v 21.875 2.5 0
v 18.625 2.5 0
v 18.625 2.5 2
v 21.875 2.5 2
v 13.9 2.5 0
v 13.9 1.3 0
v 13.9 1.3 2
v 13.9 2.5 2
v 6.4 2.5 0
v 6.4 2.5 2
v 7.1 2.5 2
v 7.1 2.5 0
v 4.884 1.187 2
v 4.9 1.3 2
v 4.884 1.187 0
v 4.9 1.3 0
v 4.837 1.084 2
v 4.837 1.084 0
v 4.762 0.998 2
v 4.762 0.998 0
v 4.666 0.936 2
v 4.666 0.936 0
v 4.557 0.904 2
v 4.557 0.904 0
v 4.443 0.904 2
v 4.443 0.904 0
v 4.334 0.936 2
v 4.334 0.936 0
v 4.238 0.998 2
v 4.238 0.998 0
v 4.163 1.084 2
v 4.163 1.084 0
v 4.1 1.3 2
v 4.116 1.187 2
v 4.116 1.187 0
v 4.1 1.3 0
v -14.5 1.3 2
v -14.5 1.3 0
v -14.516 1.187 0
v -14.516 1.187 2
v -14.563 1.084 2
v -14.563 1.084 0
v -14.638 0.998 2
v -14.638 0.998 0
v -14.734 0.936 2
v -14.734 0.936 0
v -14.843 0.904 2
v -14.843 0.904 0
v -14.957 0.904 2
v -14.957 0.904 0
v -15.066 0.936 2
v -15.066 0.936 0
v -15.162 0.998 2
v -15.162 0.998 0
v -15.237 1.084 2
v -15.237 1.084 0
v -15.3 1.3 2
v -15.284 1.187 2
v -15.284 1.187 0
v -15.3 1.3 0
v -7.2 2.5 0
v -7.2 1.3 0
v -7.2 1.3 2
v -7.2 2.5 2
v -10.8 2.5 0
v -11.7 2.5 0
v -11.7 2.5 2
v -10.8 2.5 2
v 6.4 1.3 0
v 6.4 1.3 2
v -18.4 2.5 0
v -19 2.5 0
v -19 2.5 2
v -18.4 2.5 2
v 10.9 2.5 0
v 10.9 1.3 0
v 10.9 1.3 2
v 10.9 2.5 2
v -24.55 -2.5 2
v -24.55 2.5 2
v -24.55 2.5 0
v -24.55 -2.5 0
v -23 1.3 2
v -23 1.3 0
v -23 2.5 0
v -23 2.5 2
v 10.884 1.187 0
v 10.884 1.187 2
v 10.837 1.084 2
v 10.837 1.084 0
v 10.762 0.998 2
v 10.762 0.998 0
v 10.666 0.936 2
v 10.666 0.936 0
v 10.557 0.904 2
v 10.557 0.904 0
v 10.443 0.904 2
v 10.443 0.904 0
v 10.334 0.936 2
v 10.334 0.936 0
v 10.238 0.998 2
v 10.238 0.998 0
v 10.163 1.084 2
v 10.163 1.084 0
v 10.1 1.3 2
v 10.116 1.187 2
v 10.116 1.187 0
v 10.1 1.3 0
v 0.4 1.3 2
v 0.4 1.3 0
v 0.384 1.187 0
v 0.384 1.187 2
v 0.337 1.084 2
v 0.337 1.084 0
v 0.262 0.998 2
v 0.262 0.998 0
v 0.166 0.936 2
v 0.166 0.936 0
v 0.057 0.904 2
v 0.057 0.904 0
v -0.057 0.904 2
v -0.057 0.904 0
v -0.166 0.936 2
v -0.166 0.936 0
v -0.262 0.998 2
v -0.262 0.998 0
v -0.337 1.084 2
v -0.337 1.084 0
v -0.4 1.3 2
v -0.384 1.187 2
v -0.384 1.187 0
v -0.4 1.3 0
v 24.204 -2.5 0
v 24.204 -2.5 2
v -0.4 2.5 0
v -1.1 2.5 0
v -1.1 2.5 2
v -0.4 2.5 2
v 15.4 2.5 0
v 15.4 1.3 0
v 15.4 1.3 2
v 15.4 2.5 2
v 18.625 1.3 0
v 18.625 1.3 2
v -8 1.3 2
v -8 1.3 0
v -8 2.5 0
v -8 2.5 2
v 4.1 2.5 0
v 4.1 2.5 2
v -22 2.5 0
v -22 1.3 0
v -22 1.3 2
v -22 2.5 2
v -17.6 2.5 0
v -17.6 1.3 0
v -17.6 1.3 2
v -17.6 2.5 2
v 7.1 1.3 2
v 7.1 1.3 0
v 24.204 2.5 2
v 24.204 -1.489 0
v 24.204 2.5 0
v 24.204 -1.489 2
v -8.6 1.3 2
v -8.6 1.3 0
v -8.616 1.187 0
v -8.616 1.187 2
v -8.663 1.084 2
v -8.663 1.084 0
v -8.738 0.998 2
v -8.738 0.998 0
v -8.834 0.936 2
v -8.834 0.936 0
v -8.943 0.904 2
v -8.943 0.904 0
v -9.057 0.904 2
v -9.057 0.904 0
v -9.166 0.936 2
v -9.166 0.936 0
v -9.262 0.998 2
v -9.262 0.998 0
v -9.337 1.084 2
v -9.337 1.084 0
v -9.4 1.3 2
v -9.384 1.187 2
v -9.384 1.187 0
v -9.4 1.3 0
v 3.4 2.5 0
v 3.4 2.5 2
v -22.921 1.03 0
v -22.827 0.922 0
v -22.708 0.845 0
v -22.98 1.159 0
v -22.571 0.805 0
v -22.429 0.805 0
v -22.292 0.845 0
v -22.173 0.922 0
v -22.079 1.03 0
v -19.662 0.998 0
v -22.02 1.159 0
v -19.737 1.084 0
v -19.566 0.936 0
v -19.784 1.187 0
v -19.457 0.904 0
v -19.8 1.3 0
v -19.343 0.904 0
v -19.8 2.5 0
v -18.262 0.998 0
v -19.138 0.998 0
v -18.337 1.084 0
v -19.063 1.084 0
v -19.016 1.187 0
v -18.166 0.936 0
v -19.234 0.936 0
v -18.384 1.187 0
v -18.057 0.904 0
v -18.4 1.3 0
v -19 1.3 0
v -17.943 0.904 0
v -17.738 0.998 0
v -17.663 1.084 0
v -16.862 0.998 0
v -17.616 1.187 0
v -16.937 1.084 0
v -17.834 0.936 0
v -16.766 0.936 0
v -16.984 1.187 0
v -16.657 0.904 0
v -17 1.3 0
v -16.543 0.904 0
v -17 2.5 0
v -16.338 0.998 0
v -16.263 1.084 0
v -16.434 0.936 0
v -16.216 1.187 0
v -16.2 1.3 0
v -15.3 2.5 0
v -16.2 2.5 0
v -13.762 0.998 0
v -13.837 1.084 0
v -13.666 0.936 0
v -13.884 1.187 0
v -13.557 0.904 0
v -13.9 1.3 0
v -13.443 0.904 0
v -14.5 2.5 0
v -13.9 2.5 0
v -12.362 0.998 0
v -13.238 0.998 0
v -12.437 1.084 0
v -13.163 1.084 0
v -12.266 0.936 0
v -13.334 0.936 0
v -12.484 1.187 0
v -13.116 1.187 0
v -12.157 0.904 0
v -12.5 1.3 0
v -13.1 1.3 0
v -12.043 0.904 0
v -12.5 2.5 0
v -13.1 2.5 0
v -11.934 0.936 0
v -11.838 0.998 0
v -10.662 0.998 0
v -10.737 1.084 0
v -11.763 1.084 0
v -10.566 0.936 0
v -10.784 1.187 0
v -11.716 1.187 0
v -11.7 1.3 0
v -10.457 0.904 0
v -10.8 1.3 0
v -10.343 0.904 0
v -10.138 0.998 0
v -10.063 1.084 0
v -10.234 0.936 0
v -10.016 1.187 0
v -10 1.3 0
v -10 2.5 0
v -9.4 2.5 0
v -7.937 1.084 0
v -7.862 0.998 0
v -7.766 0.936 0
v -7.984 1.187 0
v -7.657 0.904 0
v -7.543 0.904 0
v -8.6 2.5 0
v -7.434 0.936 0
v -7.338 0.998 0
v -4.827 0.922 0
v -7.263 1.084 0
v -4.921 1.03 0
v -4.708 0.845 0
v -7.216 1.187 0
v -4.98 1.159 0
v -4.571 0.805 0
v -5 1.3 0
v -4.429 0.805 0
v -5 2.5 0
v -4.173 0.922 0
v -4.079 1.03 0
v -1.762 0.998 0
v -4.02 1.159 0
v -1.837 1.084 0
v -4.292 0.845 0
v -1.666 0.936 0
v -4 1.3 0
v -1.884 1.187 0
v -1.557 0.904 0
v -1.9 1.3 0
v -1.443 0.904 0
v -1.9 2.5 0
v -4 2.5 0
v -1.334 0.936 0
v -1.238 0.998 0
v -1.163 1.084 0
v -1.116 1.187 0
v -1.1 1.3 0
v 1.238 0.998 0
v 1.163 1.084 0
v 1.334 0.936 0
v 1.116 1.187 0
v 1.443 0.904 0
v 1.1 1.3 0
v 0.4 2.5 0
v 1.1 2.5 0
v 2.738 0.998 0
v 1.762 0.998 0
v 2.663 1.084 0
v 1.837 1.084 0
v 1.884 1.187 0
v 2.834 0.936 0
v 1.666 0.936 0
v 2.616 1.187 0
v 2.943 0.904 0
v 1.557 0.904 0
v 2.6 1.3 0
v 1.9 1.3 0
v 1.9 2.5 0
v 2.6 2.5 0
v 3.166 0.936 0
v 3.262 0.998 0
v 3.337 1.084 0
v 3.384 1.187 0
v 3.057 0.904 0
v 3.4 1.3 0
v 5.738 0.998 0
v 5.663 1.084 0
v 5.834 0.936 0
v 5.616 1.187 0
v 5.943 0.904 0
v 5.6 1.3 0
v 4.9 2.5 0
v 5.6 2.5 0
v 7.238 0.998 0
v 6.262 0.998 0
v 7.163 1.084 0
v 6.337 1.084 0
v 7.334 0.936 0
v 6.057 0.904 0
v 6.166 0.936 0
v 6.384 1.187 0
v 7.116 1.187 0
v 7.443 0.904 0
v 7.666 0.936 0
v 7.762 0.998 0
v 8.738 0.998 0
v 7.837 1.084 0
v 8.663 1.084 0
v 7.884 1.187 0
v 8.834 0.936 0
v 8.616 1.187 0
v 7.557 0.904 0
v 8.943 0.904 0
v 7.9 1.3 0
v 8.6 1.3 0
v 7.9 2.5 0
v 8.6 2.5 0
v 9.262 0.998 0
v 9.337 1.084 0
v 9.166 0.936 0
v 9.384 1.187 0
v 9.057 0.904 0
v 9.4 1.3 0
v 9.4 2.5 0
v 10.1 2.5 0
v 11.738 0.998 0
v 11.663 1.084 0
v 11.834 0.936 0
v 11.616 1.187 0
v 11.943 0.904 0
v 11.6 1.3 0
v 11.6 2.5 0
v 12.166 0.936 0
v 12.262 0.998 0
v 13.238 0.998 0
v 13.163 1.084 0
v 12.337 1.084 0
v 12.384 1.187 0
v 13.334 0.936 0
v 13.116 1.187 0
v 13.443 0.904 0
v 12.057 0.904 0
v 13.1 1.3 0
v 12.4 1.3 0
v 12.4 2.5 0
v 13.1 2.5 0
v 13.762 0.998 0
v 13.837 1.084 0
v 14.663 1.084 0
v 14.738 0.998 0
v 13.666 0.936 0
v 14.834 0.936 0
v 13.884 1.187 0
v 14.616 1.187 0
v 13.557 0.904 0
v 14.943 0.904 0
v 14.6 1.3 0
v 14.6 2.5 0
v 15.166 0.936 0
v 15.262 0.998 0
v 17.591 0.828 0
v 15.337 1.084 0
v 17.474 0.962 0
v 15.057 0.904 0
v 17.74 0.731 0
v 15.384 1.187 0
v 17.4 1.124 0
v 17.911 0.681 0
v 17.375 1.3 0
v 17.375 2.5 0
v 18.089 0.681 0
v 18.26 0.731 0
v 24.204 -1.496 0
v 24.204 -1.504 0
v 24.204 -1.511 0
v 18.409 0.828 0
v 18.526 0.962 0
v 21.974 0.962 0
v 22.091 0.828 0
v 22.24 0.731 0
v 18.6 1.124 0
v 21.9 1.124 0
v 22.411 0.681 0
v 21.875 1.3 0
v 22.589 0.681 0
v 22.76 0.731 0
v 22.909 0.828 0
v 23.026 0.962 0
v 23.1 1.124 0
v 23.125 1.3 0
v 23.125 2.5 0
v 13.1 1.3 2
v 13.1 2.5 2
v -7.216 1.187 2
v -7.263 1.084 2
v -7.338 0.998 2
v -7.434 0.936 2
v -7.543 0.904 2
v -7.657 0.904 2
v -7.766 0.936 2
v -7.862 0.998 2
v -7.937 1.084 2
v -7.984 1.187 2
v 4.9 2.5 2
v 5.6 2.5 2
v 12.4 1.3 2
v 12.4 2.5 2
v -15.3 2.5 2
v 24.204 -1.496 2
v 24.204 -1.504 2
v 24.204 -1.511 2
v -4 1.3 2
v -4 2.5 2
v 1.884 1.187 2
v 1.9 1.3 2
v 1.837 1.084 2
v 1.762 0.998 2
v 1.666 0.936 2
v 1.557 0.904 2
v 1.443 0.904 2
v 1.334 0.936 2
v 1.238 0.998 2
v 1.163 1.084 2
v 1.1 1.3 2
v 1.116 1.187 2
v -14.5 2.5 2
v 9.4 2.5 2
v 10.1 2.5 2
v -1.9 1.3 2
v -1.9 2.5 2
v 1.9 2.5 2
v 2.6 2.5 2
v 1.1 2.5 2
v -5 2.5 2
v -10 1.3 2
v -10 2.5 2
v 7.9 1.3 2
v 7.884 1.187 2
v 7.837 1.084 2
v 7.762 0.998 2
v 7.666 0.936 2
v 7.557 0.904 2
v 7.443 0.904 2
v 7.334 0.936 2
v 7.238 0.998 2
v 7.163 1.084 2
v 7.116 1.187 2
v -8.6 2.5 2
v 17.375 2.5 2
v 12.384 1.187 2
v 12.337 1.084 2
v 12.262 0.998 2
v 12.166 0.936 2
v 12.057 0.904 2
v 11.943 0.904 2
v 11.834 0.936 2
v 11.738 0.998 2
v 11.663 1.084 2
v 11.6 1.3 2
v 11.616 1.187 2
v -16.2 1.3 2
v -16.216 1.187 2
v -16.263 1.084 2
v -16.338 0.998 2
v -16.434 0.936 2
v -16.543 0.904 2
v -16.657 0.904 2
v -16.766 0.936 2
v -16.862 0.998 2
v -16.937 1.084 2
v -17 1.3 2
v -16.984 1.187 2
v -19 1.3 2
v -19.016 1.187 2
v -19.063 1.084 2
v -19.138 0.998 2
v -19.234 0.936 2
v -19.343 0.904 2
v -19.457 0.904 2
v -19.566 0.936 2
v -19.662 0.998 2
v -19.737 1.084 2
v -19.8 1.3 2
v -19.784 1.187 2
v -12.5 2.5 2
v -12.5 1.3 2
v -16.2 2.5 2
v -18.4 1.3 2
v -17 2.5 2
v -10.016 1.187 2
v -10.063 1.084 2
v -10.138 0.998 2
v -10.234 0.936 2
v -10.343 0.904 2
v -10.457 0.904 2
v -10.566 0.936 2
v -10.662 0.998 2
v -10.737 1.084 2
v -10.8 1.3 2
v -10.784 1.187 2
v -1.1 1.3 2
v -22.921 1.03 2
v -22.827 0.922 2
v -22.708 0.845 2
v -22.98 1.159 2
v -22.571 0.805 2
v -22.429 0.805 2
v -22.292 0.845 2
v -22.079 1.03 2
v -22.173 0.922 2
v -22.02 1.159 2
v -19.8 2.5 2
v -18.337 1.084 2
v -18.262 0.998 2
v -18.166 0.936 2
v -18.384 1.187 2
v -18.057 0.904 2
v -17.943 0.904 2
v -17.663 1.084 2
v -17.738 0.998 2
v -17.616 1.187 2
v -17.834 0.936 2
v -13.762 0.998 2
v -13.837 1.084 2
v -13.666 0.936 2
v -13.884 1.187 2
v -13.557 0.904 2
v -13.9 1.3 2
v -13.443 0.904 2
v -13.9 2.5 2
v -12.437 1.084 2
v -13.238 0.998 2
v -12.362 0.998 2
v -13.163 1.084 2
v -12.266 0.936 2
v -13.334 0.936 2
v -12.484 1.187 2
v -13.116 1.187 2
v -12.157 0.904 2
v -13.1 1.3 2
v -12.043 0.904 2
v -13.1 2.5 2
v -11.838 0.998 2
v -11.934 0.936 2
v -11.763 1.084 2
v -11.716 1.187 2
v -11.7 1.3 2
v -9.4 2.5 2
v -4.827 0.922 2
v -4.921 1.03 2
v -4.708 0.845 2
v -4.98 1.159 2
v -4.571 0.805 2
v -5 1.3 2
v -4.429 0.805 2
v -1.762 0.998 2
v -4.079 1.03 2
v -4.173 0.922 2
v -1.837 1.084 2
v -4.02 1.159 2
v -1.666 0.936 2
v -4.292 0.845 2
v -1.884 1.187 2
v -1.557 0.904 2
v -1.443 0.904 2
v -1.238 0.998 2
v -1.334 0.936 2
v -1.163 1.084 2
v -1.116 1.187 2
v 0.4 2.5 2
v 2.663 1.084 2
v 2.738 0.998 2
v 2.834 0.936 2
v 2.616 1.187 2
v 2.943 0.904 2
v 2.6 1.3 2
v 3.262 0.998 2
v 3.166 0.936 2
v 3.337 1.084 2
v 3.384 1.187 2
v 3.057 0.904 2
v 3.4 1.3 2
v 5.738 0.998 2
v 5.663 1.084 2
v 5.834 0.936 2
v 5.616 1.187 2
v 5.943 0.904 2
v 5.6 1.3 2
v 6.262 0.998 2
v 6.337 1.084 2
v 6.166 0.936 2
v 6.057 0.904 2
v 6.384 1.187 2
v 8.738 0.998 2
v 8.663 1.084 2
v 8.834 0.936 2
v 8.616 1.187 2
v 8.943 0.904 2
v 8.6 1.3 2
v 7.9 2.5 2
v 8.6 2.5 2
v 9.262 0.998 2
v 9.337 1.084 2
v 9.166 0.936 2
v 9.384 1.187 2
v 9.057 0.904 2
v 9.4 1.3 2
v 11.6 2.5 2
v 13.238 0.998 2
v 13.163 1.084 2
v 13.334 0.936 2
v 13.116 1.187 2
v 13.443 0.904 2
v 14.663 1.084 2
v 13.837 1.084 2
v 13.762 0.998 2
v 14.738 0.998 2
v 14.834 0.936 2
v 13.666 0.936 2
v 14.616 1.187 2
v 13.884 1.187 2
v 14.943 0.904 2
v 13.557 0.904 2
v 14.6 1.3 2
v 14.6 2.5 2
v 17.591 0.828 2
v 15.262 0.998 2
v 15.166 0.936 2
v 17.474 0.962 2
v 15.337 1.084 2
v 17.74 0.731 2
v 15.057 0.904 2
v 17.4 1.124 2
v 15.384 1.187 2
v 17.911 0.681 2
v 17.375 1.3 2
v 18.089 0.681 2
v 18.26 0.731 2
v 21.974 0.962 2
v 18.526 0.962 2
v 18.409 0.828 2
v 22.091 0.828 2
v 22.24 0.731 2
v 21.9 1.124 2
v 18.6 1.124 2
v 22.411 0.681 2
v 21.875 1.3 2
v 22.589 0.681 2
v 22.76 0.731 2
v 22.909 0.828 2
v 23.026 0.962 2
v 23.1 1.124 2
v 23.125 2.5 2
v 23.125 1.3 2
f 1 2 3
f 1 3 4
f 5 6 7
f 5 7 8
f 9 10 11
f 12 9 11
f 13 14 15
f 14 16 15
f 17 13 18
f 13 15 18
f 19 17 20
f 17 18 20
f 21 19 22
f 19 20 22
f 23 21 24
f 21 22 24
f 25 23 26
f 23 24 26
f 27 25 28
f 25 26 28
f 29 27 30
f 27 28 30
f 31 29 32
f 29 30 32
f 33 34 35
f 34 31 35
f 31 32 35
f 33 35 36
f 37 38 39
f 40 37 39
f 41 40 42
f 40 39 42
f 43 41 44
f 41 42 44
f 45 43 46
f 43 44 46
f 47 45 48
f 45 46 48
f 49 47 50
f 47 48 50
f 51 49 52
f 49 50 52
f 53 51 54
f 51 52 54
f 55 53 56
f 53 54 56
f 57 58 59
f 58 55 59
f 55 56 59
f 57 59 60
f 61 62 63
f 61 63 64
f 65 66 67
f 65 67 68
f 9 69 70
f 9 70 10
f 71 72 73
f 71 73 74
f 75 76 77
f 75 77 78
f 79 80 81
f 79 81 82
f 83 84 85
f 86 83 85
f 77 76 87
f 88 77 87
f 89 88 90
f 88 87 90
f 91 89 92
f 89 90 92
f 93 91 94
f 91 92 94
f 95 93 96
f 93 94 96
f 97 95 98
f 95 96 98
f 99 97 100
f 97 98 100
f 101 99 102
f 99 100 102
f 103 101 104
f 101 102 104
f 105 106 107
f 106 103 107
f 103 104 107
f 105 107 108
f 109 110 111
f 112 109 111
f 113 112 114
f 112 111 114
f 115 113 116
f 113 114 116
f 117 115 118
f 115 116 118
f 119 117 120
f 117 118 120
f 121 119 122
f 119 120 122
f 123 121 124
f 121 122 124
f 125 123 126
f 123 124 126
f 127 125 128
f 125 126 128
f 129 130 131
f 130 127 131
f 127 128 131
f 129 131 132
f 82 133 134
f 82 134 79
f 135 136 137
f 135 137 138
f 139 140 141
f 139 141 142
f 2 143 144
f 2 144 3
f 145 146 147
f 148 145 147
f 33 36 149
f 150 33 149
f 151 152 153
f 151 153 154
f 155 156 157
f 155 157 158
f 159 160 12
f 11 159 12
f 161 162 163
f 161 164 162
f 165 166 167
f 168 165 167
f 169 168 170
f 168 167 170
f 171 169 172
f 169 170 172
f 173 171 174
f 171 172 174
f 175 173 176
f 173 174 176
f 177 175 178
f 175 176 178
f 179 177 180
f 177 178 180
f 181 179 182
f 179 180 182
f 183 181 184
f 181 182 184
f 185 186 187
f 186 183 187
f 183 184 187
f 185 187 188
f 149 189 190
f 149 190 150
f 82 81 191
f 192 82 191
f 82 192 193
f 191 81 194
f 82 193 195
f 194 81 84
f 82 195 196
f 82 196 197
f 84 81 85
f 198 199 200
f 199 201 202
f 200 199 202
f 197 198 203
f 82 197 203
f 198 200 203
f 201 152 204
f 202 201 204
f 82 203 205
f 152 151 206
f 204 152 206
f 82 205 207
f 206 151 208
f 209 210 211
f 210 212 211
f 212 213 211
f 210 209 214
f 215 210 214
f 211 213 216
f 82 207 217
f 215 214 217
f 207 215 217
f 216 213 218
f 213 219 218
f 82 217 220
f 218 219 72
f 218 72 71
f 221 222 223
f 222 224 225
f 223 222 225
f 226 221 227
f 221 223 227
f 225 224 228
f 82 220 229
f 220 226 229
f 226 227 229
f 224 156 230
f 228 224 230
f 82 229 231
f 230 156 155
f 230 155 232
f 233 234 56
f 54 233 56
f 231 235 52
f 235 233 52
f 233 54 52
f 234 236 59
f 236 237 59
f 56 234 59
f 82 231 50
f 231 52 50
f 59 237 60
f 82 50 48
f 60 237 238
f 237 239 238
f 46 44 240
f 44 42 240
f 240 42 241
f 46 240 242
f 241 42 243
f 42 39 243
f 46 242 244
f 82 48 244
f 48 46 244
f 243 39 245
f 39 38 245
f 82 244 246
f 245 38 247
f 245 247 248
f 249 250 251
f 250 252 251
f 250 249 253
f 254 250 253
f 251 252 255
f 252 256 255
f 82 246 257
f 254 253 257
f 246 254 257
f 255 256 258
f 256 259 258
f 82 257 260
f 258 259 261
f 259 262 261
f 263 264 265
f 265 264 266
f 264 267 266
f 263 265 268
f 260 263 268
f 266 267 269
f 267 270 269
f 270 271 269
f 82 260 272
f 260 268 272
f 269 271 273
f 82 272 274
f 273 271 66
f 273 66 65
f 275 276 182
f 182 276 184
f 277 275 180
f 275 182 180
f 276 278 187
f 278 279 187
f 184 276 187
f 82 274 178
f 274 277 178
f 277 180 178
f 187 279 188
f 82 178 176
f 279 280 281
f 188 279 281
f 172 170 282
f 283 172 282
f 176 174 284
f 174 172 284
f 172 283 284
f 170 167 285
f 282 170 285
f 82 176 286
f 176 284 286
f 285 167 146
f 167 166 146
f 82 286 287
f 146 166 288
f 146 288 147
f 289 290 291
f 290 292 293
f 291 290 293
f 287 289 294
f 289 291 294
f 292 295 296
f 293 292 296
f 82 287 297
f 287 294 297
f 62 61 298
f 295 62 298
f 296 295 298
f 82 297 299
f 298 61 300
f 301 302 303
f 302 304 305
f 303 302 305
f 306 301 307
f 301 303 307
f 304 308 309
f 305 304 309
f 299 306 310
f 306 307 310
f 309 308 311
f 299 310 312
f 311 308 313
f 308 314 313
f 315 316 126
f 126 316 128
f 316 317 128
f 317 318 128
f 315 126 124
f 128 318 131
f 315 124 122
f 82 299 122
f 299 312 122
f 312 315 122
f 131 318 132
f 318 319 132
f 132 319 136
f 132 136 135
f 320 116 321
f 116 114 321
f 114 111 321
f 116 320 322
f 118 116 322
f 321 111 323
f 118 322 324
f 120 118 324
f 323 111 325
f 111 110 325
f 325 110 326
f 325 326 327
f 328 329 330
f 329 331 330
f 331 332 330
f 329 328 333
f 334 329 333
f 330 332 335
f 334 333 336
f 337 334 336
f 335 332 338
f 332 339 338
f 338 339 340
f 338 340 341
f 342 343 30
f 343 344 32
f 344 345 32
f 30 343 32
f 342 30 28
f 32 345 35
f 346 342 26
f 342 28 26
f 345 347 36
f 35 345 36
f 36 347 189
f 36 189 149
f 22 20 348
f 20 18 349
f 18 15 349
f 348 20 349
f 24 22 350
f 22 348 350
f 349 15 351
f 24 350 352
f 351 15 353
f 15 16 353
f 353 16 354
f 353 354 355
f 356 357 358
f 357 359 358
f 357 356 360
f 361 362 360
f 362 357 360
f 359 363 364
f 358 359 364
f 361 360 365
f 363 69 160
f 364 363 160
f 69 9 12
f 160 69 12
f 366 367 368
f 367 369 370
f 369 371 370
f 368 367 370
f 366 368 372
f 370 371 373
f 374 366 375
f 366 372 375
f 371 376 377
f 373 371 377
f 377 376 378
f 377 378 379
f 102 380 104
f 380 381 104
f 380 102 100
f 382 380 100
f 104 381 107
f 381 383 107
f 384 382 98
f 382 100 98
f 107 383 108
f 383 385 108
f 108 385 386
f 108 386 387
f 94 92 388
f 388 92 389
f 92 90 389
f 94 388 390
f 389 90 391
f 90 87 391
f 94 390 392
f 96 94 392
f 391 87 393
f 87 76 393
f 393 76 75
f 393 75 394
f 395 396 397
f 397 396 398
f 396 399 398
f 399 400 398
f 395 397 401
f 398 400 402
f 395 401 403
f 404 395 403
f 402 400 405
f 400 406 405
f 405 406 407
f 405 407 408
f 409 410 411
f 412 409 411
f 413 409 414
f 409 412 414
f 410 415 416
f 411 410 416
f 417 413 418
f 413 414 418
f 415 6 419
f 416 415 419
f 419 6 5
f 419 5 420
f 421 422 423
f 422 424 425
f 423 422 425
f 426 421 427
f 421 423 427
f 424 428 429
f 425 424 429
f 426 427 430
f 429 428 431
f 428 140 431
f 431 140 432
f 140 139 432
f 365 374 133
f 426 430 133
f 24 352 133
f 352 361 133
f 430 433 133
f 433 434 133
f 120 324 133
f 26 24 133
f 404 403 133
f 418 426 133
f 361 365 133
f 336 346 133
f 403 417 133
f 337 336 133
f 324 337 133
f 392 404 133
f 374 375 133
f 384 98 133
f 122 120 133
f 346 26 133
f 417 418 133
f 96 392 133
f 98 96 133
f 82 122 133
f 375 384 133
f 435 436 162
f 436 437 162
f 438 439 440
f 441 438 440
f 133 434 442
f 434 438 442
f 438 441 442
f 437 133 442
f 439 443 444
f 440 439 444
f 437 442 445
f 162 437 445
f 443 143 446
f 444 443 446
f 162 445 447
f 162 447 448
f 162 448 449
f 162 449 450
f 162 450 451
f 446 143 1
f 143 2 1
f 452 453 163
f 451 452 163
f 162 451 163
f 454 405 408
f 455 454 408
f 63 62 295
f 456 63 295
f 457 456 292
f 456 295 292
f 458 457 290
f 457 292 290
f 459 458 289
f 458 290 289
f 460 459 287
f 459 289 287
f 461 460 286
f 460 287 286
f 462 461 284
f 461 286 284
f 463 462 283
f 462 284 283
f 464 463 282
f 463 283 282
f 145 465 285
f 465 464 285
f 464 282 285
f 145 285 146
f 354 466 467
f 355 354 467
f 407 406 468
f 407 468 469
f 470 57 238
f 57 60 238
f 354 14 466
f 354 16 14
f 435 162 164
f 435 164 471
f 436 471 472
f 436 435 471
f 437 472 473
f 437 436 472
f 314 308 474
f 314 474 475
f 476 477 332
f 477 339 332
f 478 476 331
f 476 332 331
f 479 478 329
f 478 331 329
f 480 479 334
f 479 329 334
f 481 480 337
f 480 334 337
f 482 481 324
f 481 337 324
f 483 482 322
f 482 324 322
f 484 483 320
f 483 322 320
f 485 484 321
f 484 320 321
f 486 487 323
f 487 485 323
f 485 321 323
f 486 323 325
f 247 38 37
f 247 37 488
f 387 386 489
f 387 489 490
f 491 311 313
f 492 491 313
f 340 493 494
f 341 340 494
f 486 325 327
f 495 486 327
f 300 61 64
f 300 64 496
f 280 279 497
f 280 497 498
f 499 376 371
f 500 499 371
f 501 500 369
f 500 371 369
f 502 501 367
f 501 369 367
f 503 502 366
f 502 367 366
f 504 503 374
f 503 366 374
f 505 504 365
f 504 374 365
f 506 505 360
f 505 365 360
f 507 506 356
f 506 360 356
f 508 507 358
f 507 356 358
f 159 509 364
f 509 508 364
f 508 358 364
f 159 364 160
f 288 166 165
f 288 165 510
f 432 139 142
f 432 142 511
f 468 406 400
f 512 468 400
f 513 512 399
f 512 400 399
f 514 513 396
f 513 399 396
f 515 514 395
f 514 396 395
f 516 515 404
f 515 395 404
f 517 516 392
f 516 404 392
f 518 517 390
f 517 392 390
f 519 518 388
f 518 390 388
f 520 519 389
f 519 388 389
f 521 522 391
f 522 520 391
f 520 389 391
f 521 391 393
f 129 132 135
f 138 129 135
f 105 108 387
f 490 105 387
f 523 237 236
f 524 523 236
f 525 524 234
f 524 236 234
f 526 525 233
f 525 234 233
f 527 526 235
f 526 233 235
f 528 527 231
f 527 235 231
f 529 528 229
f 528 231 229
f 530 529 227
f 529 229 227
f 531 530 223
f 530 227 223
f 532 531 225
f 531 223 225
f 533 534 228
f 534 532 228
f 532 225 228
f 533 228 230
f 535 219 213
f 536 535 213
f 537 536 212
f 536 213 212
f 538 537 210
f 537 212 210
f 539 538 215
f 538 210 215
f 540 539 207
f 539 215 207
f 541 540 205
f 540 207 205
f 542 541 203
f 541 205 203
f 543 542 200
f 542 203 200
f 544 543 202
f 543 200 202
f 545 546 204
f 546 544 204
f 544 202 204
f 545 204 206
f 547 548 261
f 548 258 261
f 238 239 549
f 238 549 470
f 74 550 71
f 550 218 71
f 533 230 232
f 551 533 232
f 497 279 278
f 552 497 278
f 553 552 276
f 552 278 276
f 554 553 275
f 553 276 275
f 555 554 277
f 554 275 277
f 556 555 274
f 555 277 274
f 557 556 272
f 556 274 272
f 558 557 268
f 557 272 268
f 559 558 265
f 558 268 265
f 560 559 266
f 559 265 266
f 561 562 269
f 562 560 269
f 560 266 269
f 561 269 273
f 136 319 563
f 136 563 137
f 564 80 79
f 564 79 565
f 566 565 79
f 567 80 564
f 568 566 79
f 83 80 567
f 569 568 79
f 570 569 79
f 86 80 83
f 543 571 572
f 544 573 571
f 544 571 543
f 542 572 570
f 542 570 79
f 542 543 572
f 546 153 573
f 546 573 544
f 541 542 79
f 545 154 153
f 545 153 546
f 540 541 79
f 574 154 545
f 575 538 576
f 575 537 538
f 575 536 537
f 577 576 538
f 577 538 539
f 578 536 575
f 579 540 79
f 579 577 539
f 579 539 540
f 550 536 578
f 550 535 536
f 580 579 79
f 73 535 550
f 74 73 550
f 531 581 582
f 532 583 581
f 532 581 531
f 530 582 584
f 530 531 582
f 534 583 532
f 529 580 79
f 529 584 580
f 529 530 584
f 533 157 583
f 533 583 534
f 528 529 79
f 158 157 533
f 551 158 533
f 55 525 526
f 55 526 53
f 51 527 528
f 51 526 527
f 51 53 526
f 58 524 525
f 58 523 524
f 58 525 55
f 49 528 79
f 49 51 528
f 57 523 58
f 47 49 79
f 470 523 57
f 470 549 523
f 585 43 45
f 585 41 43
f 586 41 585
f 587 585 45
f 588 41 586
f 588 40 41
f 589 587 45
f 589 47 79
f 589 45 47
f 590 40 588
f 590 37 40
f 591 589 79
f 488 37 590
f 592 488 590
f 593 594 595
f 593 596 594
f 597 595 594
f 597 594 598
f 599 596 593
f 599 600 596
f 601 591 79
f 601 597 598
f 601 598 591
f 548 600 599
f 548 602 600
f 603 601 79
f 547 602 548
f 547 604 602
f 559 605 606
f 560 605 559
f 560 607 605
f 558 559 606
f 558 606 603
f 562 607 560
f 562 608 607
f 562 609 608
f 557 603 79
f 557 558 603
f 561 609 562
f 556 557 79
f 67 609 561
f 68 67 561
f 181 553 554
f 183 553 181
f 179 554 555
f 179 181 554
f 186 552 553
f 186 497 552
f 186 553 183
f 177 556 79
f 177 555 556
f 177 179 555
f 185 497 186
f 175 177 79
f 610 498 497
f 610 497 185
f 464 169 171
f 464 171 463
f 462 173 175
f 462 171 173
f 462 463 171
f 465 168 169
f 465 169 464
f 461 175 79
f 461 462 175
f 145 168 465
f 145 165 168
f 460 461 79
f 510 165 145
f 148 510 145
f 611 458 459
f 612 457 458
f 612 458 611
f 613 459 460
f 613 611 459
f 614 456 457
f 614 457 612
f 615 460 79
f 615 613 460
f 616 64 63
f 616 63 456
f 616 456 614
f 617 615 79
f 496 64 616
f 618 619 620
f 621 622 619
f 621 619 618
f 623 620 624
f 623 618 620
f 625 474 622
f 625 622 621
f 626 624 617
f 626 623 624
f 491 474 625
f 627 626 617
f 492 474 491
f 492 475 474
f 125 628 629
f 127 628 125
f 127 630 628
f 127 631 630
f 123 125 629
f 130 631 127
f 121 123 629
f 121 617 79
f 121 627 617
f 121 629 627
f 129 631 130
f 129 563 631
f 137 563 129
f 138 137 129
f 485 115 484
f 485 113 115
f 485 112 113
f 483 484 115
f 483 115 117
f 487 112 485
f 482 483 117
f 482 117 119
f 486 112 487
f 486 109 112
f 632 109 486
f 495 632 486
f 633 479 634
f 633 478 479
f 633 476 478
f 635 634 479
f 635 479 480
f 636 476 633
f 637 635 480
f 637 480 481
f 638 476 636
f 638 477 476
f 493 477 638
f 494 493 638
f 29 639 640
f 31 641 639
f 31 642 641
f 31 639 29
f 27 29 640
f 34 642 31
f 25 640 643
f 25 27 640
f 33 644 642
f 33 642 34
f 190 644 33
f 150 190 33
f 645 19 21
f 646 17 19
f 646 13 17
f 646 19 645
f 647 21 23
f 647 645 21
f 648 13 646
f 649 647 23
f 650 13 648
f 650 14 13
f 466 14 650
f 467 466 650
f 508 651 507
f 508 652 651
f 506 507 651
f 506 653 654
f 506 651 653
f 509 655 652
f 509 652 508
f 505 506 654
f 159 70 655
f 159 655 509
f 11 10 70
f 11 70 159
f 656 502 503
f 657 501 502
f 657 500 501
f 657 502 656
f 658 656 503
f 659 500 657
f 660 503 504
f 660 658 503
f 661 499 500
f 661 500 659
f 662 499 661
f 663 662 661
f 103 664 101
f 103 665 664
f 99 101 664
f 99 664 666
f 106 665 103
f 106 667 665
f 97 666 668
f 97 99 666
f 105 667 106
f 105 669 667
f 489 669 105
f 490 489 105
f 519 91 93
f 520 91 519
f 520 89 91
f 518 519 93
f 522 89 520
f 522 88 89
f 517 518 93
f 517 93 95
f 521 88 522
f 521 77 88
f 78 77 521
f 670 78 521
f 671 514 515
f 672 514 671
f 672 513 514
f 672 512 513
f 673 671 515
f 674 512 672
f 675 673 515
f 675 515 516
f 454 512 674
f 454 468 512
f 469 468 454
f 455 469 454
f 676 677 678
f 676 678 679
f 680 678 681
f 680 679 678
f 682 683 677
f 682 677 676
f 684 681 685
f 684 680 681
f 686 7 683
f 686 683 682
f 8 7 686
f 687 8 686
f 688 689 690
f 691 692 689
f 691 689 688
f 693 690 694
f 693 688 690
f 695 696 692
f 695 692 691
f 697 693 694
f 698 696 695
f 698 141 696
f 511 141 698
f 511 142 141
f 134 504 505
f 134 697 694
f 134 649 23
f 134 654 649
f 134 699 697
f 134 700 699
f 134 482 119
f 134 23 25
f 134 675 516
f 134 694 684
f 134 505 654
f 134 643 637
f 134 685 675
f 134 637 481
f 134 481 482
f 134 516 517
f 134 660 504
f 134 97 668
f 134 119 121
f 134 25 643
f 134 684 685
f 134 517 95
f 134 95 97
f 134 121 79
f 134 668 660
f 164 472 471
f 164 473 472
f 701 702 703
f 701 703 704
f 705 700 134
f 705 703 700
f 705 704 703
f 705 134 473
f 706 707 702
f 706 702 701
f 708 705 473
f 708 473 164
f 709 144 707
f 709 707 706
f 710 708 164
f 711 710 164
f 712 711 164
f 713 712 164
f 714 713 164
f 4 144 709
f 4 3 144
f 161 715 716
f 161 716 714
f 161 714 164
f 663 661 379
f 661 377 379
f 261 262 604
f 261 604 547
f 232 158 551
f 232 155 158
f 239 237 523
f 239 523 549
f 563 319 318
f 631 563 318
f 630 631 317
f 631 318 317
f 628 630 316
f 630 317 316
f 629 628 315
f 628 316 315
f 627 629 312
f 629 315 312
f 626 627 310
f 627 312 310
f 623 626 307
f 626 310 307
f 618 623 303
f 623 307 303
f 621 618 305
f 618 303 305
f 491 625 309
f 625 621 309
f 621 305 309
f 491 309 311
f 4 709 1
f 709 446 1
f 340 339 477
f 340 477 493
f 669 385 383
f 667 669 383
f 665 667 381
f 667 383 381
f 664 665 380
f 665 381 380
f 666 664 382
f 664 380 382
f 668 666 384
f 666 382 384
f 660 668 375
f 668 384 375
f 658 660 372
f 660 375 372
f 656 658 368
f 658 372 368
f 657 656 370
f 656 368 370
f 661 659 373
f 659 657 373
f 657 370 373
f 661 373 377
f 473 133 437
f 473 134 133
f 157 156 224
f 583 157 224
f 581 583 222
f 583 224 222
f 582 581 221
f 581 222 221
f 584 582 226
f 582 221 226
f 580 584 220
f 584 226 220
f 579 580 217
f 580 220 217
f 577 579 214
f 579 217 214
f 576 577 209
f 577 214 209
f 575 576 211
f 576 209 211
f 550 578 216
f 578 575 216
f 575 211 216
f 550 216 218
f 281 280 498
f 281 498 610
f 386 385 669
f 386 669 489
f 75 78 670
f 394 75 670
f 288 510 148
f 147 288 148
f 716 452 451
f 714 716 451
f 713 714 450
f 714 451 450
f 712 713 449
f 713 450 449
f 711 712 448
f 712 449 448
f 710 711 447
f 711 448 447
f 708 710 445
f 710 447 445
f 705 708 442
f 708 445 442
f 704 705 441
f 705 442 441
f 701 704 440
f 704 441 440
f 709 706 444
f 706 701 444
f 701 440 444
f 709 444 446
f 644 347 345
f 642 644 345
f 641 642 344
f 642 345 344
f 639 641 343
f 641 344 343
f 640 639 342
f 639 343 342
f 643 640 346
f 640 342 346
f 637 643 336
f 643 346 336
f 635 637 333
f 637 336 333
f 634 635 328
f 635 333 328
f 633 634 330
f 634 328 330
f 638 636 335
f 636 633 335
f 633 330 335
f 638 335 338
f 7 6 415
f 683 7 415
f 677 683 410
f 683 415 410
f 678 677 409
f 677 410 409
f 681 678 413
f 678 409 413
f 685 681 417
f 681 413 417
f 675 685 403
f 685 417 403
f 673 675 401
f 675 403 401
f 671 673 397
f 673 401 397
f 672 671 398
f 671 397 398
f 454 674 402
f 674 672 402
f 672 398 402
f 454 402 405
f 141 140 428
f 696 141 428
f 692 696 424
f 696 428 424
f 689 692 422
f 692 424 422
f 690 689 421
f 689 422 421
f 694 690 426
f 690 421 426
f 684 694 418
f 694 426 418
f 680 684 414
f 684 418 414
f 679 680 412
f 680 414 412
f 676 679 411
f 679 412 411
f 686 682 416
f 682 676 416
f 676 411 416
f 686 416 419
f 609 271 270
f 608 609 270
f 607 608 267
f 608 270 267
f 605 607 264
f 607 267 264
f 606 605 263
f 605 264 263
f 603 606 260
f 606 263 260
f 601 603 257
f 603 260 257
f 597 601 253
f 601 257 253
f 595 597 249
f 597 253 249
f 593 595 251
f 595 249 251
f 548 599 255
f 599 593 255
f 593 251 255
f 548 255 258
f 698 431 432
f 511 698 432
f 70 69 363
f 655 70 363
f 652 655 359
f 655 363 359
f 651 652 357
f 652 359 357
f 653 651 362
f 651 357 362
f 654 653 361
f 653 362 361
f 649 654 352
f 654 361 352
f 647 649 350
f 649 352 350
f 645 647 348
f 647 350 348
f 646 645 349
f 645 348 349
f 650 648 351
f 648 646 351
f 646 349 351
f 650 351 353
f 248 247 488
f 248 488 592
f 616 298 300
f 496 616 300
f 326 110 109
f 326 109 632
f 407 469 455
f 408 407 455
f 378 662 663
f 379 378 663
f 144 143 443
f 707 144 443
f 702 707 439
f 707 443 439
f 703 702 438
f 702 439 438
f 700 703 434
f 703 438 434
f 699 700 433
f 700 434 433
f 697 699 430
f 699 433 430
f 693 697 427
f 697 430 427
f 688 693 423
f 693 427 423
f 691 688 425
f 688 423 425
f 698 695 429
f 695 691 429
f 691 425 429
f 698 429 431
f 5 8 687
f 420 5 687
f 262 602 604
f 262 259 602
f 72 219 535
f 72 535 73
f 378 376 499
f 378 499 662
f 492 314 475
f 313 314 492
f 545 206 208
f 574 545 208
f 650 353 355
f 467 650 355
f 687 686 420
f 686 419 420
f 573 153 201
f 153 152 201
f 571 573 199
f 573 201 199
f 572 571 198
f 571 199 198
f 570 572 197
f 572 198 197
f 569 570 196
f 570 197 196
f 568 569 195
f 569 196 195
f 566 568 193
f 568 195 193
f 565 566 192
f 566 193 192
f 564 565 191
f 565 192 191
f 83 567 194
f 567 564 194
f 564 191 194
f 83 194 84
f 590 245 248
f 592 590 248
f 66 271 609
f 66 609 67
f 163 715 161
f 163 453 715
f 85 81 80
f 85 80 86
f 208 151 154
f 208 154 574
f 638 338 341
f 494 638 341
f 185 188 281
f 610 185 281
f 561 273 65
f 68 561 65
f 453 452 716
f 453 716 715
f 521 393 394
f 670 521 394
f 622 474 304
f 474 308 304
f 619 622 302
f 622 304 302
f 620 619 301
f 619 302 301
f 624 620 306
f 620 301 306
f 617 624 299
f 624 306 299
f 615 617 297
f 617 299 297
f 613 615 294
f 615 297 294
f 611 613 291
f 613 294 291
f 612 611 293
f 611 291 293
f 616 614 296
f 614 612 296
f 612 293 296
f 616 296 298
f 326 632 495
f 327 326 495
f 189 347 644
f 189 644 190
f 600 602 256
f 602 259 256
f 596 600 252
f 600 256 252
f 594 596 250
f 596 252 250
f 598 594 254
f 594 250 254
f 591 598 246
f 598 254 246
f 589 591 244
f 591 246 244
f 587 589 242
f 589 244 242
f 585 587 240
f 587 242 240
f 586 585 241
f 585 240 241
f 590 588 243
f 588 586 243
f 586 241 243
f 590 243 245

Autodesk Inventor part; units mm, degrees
ref_plane "YZ Plane" through (0, 0, 0) normal (1, 0, 0) x (0, 1, 0)
ref_plane "XZ Plane" through (0, 0, 0) normal (0, 1, 0) x (-1, 0, 0)
sketch "Sketch1" plane through (0, 0, 0) normal (0, 0, 1) x (1, 0, 0)
  line L0 (-25.25, 2.5) -> (25.25, 2.5)
  line L1 (25.25, 2.5) -> (25.25, -2.5)
  line L2 (25.25, -2.5) -> (-25.25, -2.5)
  line L3 (-25.25, -2.5) -> (-25.25, 2.5)
  circle A0 centre (-22.5, 1.3) radius 0.5
  circle A1 centre (-19.4, 1.3) radius 0.4
  circle A2 centre (-10.4, 1.3) radius 0.4
  circle A3 centre (-18, 1.3) radius 0.4
  circle A4 centre (-13.5, 1.3) radius 0.4
  circle A5 centre (-16.6, 1.3) radius 0.4
  circle A6 centre (-14.9, 1.3) radius 0.4
  circle A7 centre (-12.1, 1.3) radius 0.4
  circle A8 centre (-7.6, 1.3) radius 0.4
  circle A9 centre (-9, 1.3) radius 0.4
  line L4 (0, 0) -> (0, 2.997) construction
  line L5 (0, 0) -> (1.9732, 0) construction
  circle A10 centre (-4.5, 1.3) radius 0.5
  circle A11 centre (-1.5, 1.3) radius 0.4
  circle A12 centre (0, 1.3) radius 0.4
  circle A13 centre (1.5, 1.3) radius 0.4
  circle A14 centre (3, 1.3) radius 0.4
  circle A15 centre (4.5, 1.3) radius 0.4
  circle A16 centre (6, 1.3) radius 0.4
  circle A17 centre (7.5, 1.3) radius 0.4
  circle A18 centre (9, 1.3) radius 0.4
  circle A19 centre (10.5, 1.3) radius 0.4
  circle A20 centre (12, 1.3) radius 0.4
  circle A21 centre (13.5, 1.3) radius 0.4
  circle A22 centre (15, 1.3) radius 0.4
  circle A23 centre (18, 1.3) radius 0.625
  circle A24 centre (22.5, 1.3) radius 0.625
  line L6 (-22, 1.3) -> (-22, 2.5)
  line L7 (-23, 1.3) -> (-23, 2.5)
  line L8 (-19, 1.3) -> (-19, 2.5)
  line L9 (-19.8, 1.3) -> (-19.8, 2.5)
  line L10 (-17.6, 1.3) -> (-17.6, 2.5)
  line L11 (-18.4, 1.3) -> (-18.4, 2.5)
  line L12 (-16.2, 1.3) -> (-16.2, 2.5)
  line L13 (-17, 1.3) -> (-17, 2.5)
  line L14 (-14.5, 1.3) -> (-14.5, 2.5)
  line L15 (-15.3, 1.3) -> (-15.3, 2.5)
  line L16 (-13.1, 1.3) -> (-13.1, 2.5)
  line L17 (-13.9, 1.3) -> (-13.9, 2.5)
  line L18 (-11.7, 1.3) -> (-11.7, 2.5)
  line L19 (-12.5, 1.3) -> (-12.5, 2.5)
  line L20 (-10, 1.3) -> (-10, 2.5)
  line L21 (-10.8, 1.3) -> (-10.8, 2.5)
  line L22 (-8.6, 1.3) -> (-8.6, 2.5)
  line L23 (-9.4, 1.3) -> (-9.4, 2.5)
  line L24 (-7.2, 1.3) -> (-7.2, 2.5)
  line L25 (-8, 1.3) -> (-8, 2.5)
  line L26 (-4, 1.3) -> (-4, 2.5)
  line L27 (-5, 1.3) -> (-5, 2.5)
  line L28 (-1.1, 1.3) -> (-1.1, 2.5)
  line L29 (-1.9, 1.3) -> (-1.9, 2.5)
  line L30 (0.4, 1.3) -> (0.4, 2.5)
  line L31 (-0.4, 1.3) -> (-0.4, 2.5)
  line L32 (1.9, 1.3) -> (1.9, 2.5)
  line L33 (1.1, 1.3) -> (1.1, 2.5)
  line L34 (2.6, 1.3) -> (2.6, 2.5)
  line L35 (3.4, 1.3) -> (3.4, 2.5)
  line L36 (4.1, 1.3) -> (4.1, 2.5)
  line L37 (4.9, 1.3) -> (4.9, 2.5)
  line L38 (5.6, 1.3) -> (5.6, 2.5)
  line L39 (6.4, 1.3) -> (6.4, 2.5)
  line L40 (7.1, 1.3) -> (7.1, 2.5)
  line L41 (7.9, 1.3) -> (7.9, 2.5)
  line L42 (8.6, 1.3) -> (8.6, 2.5)
  line L43 (9.4, 1.3) -> (9.4, 2.5)
  line L44 (10.1, 1.3) -> (10.1, 2.5)
  line L45 (10.9, 1.3) -> (10.9, 2.5)
  line L46 (11.6, 1.3) -> (11.6, 2.5)
  line L47 (12.4, 1.3) -> (12.4, 2.5)
  line L48 (13.1, 1.3) -> (13.1, 2.5)
  line L49 (13.9, 1.3) -> (13.9, 2.5)
  line L50 (14.6, 1.3) -> (14.6, 2.5)
  line L51 (15.4, 1.3) -> (15.4, 2.5)
  line L52 (17.375, 1.3) -> (17.375, 2.5)
  line L53 (18.625, 1.3) -> (18.625, 2.5)
  line L54 (23.125, 1.3) -> (23.125, 2.5)
  line L55 (21.875, 1.3) -> (21.875, 2.5)
  circle A25 centre (22.5, -1.3) radius 0.625
  circle A26 centre (18, -1.3) radius 0.625
  circle A27 centre (15, -1.3) radius 0.4
  circle A28 centre (13.5, -1.3) radius 0.4
  circle A29 centre (12, -1.3) radius 0.4
  circle A30 centre (10.5, -1.3) radius 0.4
  circle A31 centre (9, -1.3) radius 0.4
  circle A32 centre (7.5, -1.3) radius 0.4
  circle A33 centre (6, -1.3) radius 0.4
  circle A34 centre (4.5, -1.3) radius 0.4
  circle A35 centre (3, -1.3) radius 0.4
  circle A36 centre (1.5, -1.3) radius 0.4
  circle A37 centre (0, -1.3) radius 0.4
  circle A38 centre (-1.5, -1.3) radius 0.4
  circle A39 centre (-7.5, -1.3) radius 0.4
  circle A40 centre (-9, -1.3) radius 0.4
  circle A41 centre (-10.5, -1.3) radius 0.4
  circle A42 centre (-12.6, -1.3) radius 0.4
  circle A43 centre (-14.4, -1.3) radius 0.4
  circle A44 centre (-16.5, -1.3) radius 0.4
  circle A45 centre (-18, -1.3) radius 0.4
  circle A46 centre (-19.5, -1.3) radius 0.4
  circle A47 centre (-21.6, -1.3) radius 0.4
  circle A48 centre (-23.4, -1.3) radius 0.4
  line L56 (23.125, -1.3) -> (23.125, -2.5)
  line L57 (21.875, -1.3) -> (21.875, -2.5)
  line L58 (18.625, -1.3) -> (18.625, -2.5)
  line L59 (17.375, -1.3) -> (17.375, -2.5)
  line L60 (15.4, -1.3) -> (15.4, -2.5)
  line L61 (14.6, -1.3) -> (14.6, -2.5)
  line L62 (13.9, -1.3) -> (13.9, -2.5)
  line L63 (13.1, -1.3) -> (13.1, -2.5)
  line L64 (12.4, -1.3) -> (12.4, -2.5)
  line L65 (11.6, -1.3) -> (11.6, -2.5)
  line L66 (10.9, -1.3) -> (10.9, -2.5)
  line L67 (10.1, -1.3) -> (10.1, -2.5)
  line L68 (9.4, -1.3) -> (9.4, -2.5)
  line L69 (8.6, -1.3) -> (8.6, -2.5)
  line L70 (7.9, -1.3) -> (7.9, -2.5)
  line L71 (7.1, -1.3) -> (7.1, -2.5)
  line L72 (6.4, -1.3) -> (6.4, -2.5)
  line L73 (5.6, -1.3) -> (5.6, -2.5)
  line L74 (4.9, -1.3) -> (4.9, -2.5)
  line L75 (4.1, -1.3) -> (4.1, -2.5)
  line L76 (3.4, -1.3) -> (3.4, -2.5)
  line L77 (2.6, -1.3) -> (2.6, -2.5)
  line L78 (1.9, -1.3) -> (1.9, -2.5)
  line L79 (1.1, -1.3) -> (1.1, -2.5)
  line L80 (0.4, -1.3) -> (0.4, -2.5)
  line L81 (-0.4, -1.3) -> (-0.4, -2.5)
  line L82 (-1.9, -1.3) -> (-1.9, -2.5)
  line L83 (-1.1, -1.3) -> (-1.1, -2.5)
  line L84 (-7.9, -1.3) -> (-7.9, -2.5)
  line L85 (-7.1, -1.3) -> (-7.1, -2.5)
  line L86 (-8.6, -1.3) -> (-8.6, -2.5)
  line L87 (-9.4, -1.3) -> (-9.4, -2.5)
  line L88 (-10.1, -1.3) -> (-10.1, -2.5)
  line L89 (-10.9, -1.3) -> (-10.9, -2.5)
  line L90 (-12.2, -1.3) -> (-12.2, -2.5)
  line L91 (-13, -1.3) -> (-13, -2.5)
  line L92 (-14, -1.3) -> (-14, -2.5)
  line L93 (-14.8, -1.3) -> (-14.8, -2.5)
  line L94 (-16.1, -1.3) -> (-16.1, -2.5)
  line L95 (-16.9, -1.3) -> (-16.9, -2.5)
  line L96 (-17.6, -1.3) -> (-17.6, -2.5)
  line L97 (-18.4, -1.3) -> (-18.4, -2.5)
  line L98 (-19.1, -1.3) -> (-19.1, -2.5)
  line L99 (-19.9, -1.3) -> (-19.9, -2.5)
  line L100 (-21.2, -1.3) -> (-21.2, -2.5)
  line L101 (-22, -1.3) -> (-22, -2.5)
  line L102 (-23, -1.3) -> (-23, -2.5)
  line L103 (-23.8, -1.3) -> (-23.8, -2.5)
  dimension "d0" = 50.5
  dimension "d1" = 5
  dimension "d3" = 1
  dimension "d4" = 2.75
  dimension "d5" = 0.8
  dimension "d6" = 0.8
  dimension "d7" = 0.8
  dimension "d8" = 0.8
  dimension "d9" = 0.8
  dimension "d10" = 0.8
  dimension "d11" = 0.8
  dimension "d12" = 0.8
  dimension "d13" = 0.8
  dimension "d14" = 3.1
  dimension "d15" = 1.4
  dimension "d16" = 1.4
  dimension "d17" = 1.4
  dimension "d18" = 1.4
  dimension "d19" = 1.7
  dimension "d20" = 1.4
  dimension "d21" = 1.4
  dimension "d22" = 1.7
  dimension "d23" = 1.2
  dimension "d24" = 1
  dimension "d25" = 3.1
  dimension "d26" = 0.8
  dimension "d27" = 0.8
  dimension "d28" = 0.8
  dimension "d29" = 0.8
  dimension "d30" = 0.8
  dimension "d31" = 0.8
  dimension "d32" = 0.8
  dimension "d33" = 0.8
  dimension "d34" = 0.8
  dimension "d35" = 0.8
  dimension "d36" = 0.8
  dimension "d37" = 0.8
  dimension "d38" = 3
  dimension "d39" = 1.5
  dimension "d40" = 1.5
  dimension "d41" = 1.5
  dimension "d42" = 1.5
  dimension "d43" = 1.5
  dimension "d44" = 1.5
  dimension "d45" = 1.5
  dimension "d46" = 1.5
  dimension "d47" = 1.5
  dimension "d48" = 1.5
  dimension "d49" = 1.5
  dimension "d50" = 1.25
  dimension "d51" = 1.25
  dimension "d52" = 3
  dimension "d53" = 4.5
  dimension "d121" = 1.25
  dimension "d122" = 1.25
  dimension "d125" = 0.8
  dimension "d126" = 0.8
  dimension "d127" = 0.8
  dimension "d128" = 0.8
  dimension "d129" = 0.8
  dimension "d130" = 0.8
  dimension "d131" = 0.8
  dimension "d132" = 0.8
  dimension "d133" = 0.8
extrude "Extrusion1" add sketch "Sketch1" along normal blind 2 contours L0 L7 A0 L6 L9 A1 L8 L11 A3 L10 L13 A5 L12 L15 A6 L14 L17 A4 L16 L19 A7 L18 L21 A2 L20 L23 A9 L22 L25 A8 L24 L27 A10 L26 L29 A11 L28 L31 A12 L30 L33 A13 L32 L34 A14 L35 L36 A15 L37 L38 A16 L39 L40 A17 L41 L42 A18 L43 L44 A19 L45 L46 A20 L47 L48 A21 L49 L50 A22 L51 L52 A23 L53 L55 A24 L54 L1 L2 L56 A25 L57 L58 A26 L59 L60 A27 L61 L62 A28 L63 L64 A29 L65 L66 A30 L67 L68 A31 L69 L70 A32 L71 L72 A33 L73 L74 A34 L75 L76 A35 L77 L78 A36 L79 L80 A37 L81 L83 A38 L82 L85 A39 L84 L86 A40 L87 L88 A41 L89 L90 A42 L91 L92 A43 L93 L94 A44 L95 L96 A45 L97 L98 A46 L99 L100 A47 L101 L102 A48 L103 L3
ref_plane "Work Plane1" through (-26.5, -2, 0) normal (-1, 0, 0) x (0, 0, 1)
sketch "Sketch12" plane through (0, 0, 0) normal (0, 0, -1) x (-1, 0, 0)
  arc A0 (-24.0126, -0.5173) -> (-23.9919, 1.0846) centre (-25.2704, 0.3) ccw projected
  arc A1 (-24.2504, 2) -> (-23.9919, 1.0846) centre (-22.5004, 2) ccw projected
  arc A2 (-24.0126, -0.5173) -> (-24.2331, -2) centre (-22.5004, -1.5) ccw projected
  line L0 (-24.2331, -2) -> (-25.0004, -2) projected
  line L1 (-25.0004, 2) -> (-24.2504, 2) projected
  line L2 (-25.0004, -2.1) -> (-24.0947, -2.1)
  arc A3 (-23.9286, -0.5716) -> (-23.8794, -2.5) centre (-22.5004, -1.5) ccw
  arc A4 (-23.9286, -0.5716) -> (-23.9067, 1.1369) centre (-25.2704, 0.3) ccw
  arc A5 (-24.1474, 2.1) -> (-23.9067, 1.1369) centre (-22.5004, 2) ccw
  line L3 (-24.1474, 2.1) -> (-25, 2.1)
  line L4 (-24.1474, 2.1) -> (-24.1474, 2.5)
  line L5 (-25.25, 2.5) -> (-23.125, 2.5) projected
  line L6 (-24.1474, 2.5) -> (-25.25, 2.5)
  line L7 (-23.125, -2.5) -> (-25.25, -2.5) projected
  line L8 (-25.25, 2.5) -> (-25.25, -2.5)
  line L9 (-25.25, -2.5) -> (-24.0947, -2.5)
  line L10 (-24.0947, -2.1) -> (-24.0947, -2.5)
  point P0 (0, 0)
  dimension "d188" = 0.1
extrude "Extrusion12" cut sketch "Sketch12" against normal blind 10
sketch "Sketch13" plane through (0, 0, 0) normal (0, 0, -1) x (-1, 0, 0)
  arc A0 (24.3834, 0.9639) -> (24.3834, -0.9639) centre (26.1358, 0) ccw projected
  arc A1 (24.3834, 0.9639) -> (24.6496, 2) centre (22.4996, 2) ccw projected
  arc A2 (24.6496, -2) -> (24.3834, -0.9639) centre (22.4996, -2) ccw projected
  line L0 (24.6496, -2) -> (25, -2) projected
  line L1 (24.9996, 2) -> (24.6496, 2) projected
  line L2 (24.6496, 2) -> (24.6496, 2.5)
  line L3 (23, 2.5) -> (25.25, 2.5) projected
  line L4 (24.6496, -2) -> (24.6496, -2.5)
  line L5 (25.25, -2.5) -> (23.8, -2.5) projected
  line L6 (24.6496, -2.5) -> (25.25, -2.5)
  line L7 (25.25, -2.5) -> (25.25, 2.5)
  line L8 (25.25, 2.5) -> (25.25, -2.5) projected
  line L9 (25.25, 2.5) -> (24.6496, 2.5)
  line L10 (25, -2.1) -> (24.5471, -2.1)
  arc A3 (24.5471, -2.1) -> (24.2958, -1.012) centre (22.4996, -2) ccw
  arc A4 (24.2958, 1.012) -> (24.2958, -1.012) centre (26.1358, 0) ccw
  arc A5 (24.2958, 1.012) -> (24.5471, 2.1) centre (22.4996, 2) ccw
  line L11 (24.5471, 2.1) -> (25, 2.1)
  line L12 (24.55, -2.6) -> (25.35, -2.6)
  line L13 (25.35, -2.6) -> (25.35, 2.6)
  line L14 (25.35, 2.6) -> (24.55, 2.6)
  line L15 (24.5471, -2.5) -> (24.6496, -2.5)
  line L16 (24.6496, 2.5) -> (24.5471, 2.5)
  line L17 (24.5471, 2.1) -> (24.5471, 2.5)
  line L18 (24.5471, 2.5) -> (24.6496, 2.5)
  line L19 (24.5471, -2.1) -> (24.5471, -2.5)
  line L20 (24.5471, -2.5) -> (24.6496, -2.5)
  point P0 (0, 0)
  dimension "d193" = 0.1
extrude "Extrusion13" cut sketch "Sketch13" against normal blind 10
sketch "Sketch14" plane through (0, 0, 0) normal (0, 0, -1) x (-1, 0, 0)
  arc A0 (6.3296, -2) -> (4.9596, -2) centre (5.6446, -2) ccw projected
  arc A1 (4.9596, -2) -> (6.3296, -2) centre (5.6446, -2) ccw projected
  arc A2 (4.0396, -2) -> (2.6696, -2) centre (3.3546, -2) ccw projected
  arc A3 (2.6696, -2) -> (4.0396, -2) centre (3.3546, -2) ccw projected
  arc A4 (4.1396, -2) -> (2.5696, -2) centre (3.3546, -2) ccw
  arc A5 (2.5696, -2) -> (4.1396, -2) centre (3.3546, -2) ccw
  arc A6 (6.4296, -2) -> (4.8596, -2) centre (5.6446, -2) ccw
  arc A7 (4.8596, -2) -> (6.4296, -2) centre (5.6446, -2) ccw
  point P0 (0, 0)
  dimension "d195" = 0.1
  dimension "d196" = 0.1
extrude "Extrusion14" cut sketch "Sketch14" against normal blind 10 contours A1 A0 | A3 A2 | A5 A4 | A7 A6
sketch "Sketch15" plane through (0, 0, 2) normal (0, 0, 1) x (1, 0, 0)
  line L0 (-23.8, -0.675) -> (23.125, -0.675)
  line L1 (23.125, -0.675) -> (23.125, -2.5)
  line L2 (23.125, -2.5) -> (-23.8, -2.5)
  line L3 (-23.8, -2.5) -> (-23.8, -0.675)
  line L4 (-23.8, -2.5) -> (-23.8, -1.3) projected
  line L5 (23.125, -1.3) -> (23.125, -2.5) projected
  line L6 (18.625, -2.5) -> (21.875, -2.5) projected
  arc A0 (23.125, -1.3) -> (21.875, -1.3) centre (22.5, -1.3) ccw projected
  line L7 (-24.5471, -2.5) -> (-23.8, -2.5) projected
  line L8 (-24.5496, 2.5) -> (-23.8, 2.5)
  line L9 (-23.8, 2.5) -> (-23.8, -2.5)
  line L10 (-23.8, -2.5) -> (-24.5496, -2.5)
  line L11 (24.2038, 2.5) -> (23.125, 2.5)
  line L12 (23.125, 2.5) -> (23.125, -2.5)
  line L13 (23.125, -2.5) -> (24.2038, -2.5)
  arc A1 (23.8794, -2.5) -> (23.9286, -0.5716) centre (22.5004, -1.5) ccw projected
  line L14 (-24.5496, 2.5117) -> (-24.5496, -2.5071)
  arc A2 (-24.2958, -1.012) -> (-24.5471, -2.1) centre (-22.4996, -2) ccw projected
  line L15 (24.2038, -2.5071) -> (24.2038, 2.5117)
  point P0 (0, 0)
  point P1 (-23.8, -1.9)
  point P2 (23.125, -1.9)
  point P3 (20.25, -2.5)
  point P4 (22.5, -0.675)
  point P5 (24.1474, 2.5)
extrude "Extrusion15" add sketch "Sketch15" against normal up to surface (2 mm away)
properties part number "3d_LM-Welding_Tooling - Top Comb" material "Steel, Carbon"
